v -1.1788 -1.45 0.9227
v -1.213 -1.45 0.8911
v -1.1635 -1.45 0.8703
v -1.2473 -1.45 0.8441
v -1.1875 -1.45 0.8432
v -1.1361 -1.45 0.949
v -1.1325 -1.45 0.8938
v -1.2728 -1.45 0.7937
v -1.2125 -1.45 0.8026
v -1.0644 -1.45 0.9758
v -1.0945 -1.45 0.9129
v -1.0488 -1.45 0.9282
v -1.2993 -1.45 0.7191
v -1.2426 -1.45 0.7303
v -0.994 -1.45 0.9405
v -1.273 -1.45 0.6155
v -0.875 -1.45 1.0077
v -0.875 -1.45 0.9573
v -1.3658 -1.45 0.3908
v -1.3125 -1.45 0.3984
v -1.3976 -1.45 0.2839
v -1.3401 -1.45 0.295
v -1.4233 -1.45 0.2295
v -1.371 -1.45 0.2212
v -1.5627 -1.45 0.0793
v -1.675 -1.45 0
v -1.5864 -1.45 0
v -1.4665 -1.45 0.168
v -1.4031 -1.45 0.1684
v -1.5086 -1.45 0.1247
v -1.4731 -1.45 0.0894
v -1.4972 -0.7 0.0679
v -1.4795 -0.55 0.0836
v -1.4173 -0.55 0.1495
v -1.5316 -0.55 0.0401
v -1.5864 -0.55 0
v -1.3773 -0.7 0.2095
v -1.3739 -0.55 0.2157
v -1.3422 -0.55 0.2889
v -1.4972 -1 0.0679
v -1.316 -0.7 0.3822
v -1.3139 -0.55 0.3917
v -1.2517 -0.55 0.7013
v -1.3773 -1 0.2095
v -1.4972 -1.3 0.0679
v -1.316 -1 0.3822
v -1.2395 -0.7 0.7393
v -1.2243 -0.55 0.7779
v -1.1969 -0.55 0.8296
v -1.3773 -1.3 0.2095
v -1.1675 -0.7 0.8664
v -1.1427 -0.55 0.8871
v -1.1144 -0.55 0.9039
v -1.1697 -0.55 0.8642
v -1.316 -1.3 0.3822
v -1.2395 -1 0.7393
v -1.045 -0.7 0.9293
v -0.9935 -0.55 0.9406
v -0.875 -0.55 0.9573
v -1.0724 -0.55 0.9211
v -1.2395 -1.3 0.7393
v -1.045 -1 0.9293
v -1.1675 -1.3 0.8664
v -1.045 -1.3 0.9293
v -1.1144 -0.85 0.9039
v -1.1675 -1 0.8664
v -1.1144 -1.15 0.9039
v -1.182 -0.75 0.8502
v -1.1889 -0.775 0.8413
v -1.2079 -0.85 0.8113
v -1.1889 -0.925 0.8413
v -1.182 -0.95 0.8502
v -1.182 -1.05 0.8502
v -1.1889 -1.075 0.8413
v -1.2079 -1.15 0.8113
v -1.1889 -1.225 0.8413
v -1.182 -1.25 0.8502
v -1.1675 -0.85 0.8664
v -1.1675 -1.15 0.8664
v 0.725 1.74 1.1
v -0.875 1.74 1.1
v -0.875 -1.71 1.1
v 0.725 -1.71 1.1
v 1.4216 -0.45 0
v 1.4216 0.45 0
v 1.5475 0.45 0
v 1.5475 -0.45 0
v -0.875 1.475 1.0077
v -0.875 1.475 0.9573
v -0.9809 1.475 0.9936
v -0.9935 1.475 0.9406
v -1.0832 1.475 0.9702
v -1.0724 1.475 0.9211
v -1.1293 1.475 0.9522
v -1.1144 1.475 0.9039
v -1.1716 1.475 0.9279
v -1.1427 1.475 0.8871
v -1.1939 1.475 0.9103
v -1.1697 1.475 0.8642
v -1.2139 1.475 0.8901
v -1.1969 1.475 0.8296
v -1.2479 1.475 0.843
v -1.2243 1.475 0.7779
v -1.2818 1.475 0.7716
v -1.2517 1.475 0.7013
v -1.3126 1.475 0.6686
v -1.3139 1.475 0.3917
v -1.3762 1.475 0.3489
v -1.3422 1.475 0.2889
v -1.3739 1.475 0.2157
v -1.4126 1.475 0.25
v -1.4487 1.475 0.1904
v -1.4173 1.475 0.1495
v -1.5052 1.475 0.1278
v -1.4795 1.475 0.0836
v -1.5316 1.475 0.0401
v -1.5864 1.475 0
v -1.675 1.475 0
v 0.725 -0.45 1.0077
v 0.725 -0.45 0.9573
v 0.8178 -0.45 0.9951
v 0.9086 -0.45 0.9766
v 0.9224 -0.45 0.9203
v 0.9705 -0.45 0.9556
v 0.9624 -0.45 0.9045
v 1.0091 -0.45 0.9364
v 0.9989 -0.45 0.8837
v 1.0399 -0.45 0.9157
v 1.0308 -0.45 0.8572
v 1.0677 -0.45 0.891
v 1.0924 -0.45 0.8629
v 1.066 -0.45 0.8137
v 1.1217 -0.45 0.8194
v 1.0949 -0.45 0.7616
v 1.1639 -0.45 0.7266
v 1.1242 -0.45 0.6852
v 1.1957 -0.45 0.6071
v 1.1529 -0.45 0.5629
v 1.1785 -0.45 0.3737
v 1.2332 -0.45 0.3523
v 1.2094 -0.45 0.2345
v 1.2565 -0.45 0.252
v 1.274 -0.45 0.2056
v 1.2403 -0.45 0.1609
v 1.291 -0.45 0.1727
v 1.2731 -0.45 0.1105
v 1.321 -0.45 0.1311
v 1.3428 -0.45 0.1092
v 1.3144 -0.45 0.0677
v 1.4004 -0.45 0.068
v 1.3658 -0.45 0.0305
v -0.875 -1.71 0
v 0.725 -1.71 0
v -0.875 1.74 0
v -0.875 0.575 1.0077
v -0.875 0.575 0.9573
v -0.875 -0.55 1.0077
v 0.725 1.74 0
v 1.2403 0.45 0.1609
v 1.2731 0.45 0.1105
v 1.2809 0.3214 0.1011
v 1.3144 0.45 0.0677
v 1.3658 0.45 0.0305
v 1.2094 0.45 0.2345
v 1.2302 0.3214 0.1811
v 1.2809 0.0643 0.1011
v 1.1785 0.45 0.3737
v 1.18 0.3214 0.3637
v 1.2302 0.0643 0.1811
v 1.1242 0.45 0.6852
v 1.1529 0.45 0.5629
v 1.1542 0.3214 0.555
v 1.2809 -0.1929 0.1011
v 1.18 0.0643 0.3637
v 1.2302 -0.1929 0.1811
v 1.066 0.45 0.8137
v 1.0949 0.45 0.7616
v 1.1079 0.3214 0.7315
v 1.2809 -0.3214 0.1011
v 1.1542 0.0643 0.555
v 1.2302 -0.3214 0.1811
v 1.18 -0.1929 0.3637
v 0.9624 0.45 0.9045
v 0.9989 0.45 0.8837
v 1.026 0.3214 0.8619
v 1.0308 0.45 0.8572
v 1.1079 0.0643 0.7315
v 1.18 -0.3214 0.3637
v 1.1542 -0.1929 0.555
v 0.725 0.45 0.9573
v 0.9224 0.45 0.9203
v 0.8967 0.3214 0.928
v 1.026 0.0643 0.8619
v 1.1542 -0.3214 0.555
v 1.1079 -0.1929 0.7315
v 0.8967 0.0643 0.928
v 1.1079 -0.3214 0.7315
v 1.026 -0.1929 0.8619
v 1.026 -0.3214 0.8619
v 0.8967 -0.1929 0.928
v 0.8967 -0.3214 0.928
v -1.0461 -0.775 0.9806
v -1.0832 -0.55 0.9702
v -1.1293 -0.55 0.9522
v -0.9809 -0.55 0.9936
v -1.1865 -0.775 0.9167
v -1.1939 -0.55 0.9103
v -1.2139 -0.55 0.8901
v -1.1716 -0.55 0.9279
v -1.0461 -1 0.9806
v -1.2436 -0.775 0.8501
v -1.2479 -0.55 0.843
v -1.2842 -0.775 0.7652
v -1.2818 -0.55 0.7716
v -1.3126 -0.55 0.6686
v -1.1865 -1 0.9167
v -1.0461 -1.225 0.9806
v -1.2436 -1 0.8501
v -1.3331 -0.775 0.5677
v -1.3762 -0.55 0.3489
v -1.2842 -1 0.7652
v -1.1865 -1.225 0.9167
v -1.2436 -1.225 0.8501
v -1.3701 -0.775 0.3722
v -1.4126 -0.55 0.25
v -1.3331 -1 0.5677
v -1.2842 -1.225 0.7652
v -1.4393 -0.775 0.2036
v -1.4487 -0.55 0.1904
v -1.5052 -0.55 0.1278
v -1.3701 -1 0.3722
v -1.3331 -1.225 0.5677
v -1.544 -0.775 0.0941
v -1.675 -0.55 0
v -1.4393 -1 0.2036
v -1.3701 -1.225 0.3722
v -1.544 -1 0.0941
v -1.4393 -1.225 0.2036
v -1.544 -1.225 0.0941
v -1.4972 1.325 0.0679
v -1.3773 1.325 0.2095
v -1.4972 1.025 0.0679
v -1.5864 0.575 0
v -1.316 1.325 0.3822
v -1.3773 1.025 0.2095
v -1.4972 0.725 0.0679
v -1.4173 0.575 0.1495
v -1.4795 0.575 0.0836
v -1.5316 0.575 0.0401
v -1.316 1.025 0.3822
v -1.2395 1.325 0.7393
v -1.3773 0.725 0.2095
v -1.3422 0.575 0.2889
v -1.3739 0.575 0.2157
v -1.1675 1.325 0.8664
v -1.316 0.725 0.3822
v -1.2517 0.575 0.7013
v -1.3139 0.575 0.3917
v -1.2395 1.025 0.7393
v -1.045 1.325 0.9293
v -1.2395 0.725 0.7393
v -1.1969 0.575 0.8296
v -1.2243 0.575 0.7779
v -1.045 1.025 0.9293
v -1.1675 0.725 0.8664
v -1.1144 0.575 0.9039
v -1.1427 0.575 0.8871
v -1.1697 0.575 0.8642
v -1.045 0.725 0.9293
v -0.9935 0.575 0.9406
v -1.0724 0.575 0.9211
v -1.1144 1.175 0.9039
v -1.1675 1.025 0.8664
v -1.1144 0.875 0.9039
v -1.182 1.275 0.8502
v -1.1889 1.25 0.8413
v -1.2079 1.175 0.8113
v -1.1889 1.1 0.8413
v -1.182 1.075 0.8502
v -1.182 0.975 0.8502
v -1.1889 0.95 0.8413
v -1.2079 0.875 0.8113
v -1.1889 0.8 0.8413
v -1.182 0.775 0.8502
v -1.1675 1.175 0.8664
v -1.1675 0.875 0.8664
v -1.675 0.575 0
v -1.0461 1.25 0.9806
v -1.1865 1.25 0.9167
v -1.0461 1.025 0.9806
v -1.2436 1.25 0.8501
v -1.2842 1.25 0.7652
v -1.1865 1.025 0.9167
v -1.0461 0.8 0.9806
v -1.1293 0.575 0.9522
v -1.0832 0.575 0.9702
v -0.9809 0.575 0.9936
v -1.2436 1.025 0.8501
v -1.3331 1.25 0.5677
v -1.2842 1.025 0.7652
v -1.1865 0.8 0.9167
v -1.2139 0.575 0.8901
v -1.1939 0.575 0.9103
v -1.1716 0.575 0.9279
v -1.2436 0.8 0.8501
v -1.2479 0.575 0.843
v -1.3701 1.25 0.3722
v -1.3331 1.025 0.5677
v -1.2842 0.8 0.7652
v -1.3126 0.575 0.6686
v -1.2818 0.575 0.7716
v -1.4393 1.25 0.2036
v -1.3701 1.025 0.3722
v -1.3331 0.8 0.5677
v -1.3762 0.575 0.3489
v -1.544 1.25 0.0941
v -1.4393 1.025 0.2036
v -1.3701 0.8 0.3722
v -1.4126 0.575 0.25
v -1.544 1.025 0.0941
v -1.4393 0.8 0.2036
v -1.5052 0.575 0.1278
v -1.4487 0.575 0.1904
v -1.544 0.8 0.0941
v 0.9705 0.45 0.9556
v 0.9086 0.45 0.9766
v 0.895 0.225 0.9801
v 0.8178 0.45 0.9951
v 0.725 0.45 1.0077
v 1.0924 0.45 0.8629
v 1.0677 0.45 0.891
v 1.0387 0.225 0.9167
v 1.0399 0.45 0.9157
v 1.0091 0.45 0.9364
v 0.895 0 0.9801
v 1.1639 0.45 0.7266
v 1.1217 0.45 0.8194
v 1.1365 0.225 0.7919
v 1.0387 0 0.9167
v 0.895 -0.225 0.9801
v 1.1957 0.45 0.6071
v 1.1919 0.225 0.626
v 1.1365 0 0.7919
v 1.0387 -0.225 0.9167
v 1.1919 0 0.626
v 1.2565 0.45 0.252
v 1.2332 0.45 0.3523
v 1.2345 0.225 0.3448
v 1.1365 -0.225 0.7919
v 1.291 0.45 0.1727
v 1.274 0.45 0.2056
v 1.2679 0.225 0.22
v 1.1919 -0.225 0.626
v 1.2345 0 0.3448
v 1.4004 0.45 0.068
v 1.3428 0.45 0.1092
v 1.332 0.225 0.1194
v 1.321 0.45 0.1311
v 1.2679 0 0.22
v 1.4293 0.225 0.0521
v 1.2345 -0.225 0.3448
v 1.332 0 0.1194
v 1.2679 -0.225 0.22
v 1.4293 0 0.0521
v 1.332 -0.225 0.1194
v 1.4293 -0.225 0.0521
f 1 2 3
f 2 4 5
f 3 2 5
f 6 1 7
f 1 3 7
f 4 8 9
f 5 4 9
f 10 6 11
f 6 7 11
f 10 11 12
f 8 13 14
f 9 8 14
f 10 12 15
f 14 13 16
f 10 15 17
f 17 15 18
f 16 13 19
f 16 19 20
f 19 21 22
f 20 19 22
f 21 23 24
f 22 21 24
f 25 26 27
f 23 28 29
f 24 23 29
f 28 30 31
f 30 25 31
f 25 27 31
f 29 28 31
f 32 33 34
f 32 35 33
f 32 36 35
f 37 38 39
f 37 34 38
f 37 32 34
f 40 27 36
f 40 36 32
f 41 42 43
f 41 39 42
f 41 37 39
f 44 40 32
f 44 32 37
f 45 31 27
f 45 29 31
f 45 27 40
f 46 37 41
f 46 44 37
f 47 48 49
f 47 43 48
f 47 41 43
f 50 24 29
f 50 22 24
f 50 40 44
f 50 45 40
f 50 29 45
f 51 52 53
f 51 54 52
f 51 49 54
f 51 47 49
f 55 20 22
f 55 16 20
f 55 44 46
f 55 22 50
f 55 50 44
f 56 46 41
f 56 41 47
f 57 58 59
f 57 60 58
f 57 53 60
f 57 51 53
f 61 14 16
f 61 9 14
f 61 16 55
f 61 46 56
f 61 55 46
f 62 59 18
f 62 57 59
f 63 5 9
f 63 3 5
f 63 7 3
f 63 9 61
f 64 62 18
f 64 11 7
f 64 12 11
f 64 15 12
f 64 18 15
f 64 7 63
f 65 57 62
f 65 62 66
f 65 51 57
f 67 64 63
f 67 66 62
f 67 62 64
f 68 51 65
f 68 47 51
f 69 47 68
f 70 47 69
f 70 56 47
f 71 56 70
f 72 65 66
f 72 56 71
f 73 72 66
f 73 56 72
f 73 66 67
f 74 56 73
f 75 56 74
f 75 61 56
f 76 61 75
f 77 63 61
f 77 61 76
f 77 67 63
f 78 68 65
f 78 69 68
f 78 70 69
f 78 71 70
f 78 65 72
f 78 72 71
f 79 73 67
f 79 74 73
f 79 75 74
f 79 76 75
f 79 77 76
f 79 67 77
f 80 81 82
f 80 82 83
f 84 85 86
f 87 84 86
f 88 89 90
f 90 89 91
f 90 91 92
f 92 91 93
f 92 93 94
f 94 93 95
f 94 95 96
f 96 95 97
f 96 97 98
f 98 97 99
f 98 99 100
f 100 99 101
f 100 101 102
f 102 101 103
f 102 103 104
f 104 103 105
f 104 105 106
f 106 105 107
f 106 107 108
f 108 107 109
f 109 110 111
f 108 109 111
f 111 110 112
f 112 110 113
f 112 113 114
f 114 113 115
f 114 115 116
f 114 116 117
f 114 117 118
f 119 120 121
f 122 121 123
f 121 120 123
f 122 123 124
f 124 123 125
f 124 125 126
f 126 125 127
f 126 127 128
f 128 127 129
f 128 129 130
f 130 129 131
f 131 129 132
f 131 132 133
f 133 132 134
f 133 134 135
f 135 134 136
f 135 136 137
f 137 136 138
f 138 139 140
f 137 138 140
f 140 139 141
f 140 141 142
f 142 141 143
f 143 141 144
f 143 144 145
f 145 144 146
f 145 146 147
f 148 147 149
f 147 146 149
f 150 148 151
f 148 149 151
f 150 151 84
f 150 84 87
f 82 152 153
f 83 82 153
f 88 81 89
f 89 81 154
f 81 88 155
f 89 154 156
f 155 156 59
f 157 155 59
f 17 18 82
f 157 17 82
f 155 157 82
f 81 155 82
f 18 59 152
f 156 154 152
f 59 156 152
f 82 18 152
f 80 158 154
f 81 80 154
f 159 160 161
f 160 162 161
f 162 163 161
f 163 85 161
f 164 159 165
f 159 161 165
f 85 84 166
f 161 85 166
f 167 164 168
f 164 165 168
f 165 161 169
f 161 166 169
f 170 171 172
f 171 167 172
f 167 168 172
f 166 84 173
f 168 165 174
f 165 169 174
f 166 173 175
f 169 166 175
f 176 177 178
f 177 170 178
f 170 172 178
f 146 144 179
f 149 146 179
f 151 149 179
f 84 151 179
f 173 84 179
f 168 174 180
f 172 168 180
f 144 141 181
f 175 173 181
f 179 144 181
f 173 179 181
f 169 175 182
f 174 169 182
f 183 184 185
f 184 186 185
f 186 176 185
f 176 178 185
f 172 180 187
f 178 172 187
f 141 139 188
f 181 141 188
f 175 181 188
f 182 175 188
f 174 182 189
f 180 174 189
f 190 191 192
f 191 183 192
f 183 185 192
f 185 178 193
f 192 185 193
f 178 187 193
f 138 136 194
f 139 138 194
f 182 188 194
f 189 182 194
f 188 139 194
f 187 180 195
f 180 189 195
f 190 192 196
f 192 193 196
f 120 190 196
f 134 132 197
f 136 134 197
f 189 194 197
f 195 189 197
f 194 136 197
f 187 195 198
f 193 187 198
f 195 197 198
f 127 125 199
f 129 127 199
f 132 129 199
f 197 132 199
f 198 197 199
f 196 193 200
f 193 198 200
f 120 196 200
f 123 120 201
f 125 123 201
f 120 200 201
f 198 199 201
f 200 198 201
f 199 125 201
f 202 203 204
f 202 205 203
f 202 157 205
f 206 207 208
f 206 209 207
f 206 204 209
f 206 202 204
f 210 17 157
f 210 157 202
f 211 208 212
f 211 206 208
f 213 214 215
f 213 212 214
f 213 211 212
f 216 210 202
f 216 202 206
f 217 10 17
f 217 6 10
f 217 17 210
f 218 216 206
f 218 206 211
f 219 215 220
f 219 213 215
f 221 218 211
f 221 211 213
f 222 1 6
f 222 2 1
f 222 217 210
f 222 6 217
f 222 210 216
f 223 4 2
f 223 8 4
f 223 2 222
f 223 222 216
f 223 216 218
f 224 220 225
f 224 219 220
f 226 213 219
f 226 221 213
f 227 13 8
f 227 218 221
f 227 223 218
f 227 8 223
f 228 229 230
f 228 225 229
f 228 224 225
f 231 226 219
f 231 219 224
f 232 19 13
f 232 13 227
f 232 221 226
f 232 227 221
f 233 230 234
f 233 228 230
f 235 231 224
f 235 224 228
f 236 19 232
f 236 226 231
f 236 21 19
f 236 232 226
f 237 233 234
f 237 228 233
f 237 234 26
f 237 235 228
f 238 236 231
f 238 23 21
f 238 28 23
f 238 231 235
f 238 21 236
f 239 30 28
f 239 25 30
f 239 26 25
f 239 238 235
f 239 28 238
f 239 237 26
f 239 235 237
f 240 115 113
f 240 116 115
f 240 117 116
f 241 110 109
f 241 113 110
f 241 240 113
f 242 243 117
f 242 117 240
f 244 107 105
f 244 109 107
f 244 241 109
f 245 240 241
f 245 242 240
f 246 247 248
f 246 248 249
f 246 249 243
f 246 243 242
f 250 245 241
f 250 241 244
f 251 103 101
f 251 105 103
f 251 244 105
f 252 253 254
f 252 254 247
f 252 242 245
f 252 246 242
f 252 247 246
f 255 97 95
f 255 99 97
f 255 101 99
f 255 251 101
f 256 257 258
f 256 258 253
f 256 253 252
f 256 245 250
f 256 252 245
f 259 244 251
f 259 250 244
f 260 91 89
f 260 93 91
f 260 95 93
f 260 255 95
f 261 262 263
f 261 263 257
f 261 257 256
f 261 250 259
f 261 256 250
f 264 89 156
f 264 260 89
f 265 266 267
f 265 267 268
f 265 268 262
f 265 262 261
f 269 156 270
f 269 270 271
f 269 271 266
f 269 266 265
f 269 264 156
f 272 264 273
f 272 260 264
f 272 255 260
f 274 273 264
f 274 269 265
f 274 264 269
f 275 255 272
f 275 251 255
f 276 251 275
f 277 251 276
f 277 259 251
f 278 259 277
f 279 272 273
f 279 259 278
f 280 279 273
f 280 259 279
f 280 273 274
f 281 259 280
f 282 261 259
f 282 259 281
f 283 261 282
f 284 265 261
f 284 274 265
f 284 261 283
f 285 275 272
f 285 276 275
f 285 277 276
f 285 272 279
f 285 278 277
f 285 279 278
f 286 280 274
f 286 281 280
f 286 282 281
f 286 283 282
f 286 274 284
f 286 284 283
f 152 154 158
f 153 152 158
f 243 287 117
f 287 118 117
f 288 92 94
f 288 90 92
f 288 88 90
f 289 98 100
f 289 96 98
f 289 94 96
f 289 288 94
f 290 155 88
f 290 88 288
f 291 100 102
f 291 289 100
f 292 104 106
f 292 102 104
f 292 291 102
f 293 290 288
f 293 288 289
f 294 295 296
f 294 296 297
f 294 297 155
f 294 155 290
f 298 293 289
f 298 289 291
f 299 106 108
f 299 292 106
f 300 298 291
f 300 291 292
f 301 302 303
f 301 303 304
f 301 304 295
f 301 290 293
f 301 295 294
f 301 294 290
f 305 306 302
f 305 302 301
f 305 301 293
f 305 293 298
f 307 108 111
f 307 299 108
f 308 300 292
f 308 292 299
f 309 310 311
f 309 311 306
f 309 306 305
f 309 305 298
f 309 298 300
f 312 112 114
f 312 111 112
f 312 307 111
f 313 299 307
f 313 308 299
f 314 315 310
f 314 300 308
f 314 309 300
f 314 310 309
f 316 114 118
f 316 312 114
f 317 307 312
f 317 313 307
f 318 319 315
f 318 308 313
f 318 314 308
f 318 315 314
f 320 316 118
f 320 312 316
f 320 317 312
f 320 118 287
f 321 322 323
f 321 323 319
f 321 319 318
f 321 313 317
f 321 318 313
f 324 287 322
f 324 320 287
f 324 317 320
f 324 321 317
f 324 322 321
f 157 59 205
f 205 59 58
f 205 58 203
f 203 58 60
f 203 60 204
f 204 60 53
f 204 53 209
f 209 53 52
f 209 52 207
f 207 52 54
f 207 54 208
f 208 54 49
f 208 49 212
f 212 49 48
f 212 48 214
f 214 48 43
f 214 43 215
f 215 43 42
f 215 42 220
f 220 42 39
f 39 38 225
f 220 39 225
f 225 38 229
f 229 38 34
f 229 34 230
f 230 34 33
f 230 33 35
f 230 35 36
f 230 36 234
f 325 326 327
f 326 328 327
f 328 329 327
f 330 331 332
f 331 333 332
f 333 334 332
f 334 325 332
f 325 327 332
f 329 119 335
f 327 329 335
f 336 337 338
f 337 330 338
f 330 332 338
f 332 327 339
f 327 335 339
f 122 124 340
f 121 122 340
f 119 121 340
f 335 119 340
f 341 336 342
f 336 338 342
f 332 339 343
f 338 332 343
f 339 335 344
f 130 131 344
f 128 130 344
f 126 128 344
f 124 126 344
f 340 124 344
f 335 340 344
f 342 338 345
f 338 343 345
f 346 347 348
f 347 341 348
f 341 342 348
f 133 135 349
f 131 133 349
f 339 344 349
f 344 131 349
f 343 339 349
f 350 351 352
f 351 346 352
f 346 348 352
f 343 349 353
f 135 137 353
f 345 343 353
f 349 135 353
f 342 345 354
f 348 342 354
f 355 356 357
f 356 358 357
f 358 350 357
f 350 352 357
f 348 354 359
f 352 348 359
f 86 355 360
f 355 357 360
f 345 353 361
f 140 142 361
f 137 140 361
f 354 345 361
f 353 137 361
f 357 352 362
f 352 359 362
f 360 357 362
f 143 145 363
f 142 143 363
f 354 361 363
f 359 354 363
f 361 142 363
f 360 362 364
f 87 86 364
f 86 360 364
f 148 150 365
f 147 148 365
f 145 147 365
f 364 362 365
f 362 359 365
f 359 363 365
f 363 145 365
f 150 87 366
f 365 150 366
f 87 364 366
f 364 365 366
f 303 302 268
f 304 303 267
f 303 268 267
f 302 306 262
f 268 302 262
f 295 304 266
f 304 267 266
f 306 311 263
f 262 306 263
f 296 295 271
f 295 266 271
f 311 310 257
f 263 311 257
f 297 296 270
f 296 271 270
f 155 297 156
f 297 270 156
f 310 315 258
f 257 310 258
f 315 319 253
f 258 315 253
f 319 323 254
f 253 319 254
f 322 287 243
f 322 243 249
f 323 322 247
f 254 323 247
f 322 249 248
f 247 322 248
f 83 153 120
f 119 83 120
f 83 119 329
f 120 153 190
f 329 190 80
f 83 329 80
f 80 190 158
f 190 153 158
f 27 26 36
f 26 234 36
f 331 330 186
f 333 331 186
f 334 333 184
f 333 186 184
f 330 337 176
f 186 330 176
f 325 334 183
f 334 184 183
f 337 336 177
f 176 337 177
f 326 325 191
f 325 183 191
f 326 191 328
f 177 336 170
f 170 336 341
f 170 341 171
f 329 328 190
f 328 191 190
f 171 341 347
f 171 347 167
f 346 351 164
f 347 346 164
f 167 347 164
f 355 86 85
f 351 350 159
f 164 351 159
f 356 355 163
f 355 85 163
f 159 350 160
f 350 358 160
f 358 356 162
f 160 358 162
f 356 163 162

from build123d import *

# Parameters (mm, degrees)
EXTRUDE1_DEPTH     = 1.1
CUT_EXTRUDE1_DEPTH = 4.19
CUT_EXTRUDE2_DEPTH = 4.19


with BuildPart() as part:
    # COMPONENT_OUTLINE → Extrude1 (new body)
    with BuildSketch(Plane.XY):
        Polygon((-0.875, -1.71), (0.725, -1.71), (0.725, -0.45), (1.5475, -0.45), (1.5475, 0.45), (0.725, 0.45), (0.725, 1.74), (-0.875, 1.74), (-0.875, 1.475), (-1.675, 1.475), (-1.675, 0.575), (-0.875, 0.575), (-0.875, -0.55), (-1.675, -0.55), (-1.675, -1.45), (-0.875, -1.45), align=None)
    extrude(amount=EXTRUDE1_DEPTH)

    # Sketch1 → Cut-Extrude1 (cut, through all)
    with BuildSketch(Plane.XZ.offset(1.45)):
        with BuildLine():
            Line((0.725, 1.1), (1.5475, 1.1))
            Line((1.5475, 1.1), (1.5475, 0))
            add(Edge.make_bspline(
                [(0.725, 1.007684008), (0.841255766, 0.993236255), (1.074434419, 0.964257843), (1.240697247, 0.566279231), (1.212102737, 0.136753725), (1.466368993, 0.033080078), (1.5475, 0)],
                knots=[0, 0, 0, 0, 0.228895666, 0.459104825, 0.827411741, 1, 1, 1, 1], degree=3))
            Line((0.725, 1.007684008), (0.725, 1.1))
        make_face()
        with BuildLine():
            Line((-0.875, 1.1), (-0.875, 1.007684008))
            add(Edge.make_bspline(
                [(-0.875, 1.007684008), (-0.992502858, 0.993714751), (-1.247070824, 0.963450589), (-1.342415555, 0.56189323), (-1.384469235, 0.196400416), (-1.584715613, 0.061032749), (-1.675, 0)],
                knots=[0, 0, 0, 0, 0.232825369, 0.504412246, 0.776556075, 1, 1, 1, 1], degree=3))
            Line((-1.675, 0), (-1.675, 1.1))
            Line((-1.675, 1.1), (-0.875, 1.1))
        make_face()
    extrude(amount=-CUT_EXTRUDE1_DEPTH, mode=Mode.SUBTRACT)

    # Sketch2 → Cut-Extrude2 (cut, through all)
    with BuildSketch(Plane.XZ.offset(1.45)):
        with BuildLine():
            Line((0.725, 0), (1.421572568, 0))
            add(Edge.make_bspline(
                [(1.421572568, 0), (1.398439084, 0.011285624), (1.375838095, 0.023644995), (1.327364404, 0.055460599), (1.301887511, 0.076567597), (1.259910489, 0.125534473), (1.243394855, 0.152637933), (1.177610694, 0.294933575), (1.174271294, 0.429683105), (1.134079821, 0.680245939), (1.093633579, 0.798176416), (0.992225356, 0.893756481), (0.949632552, 0.913640339), (0.845445066, 0.941870469), (0.7862927, 0.949660717), (0.725, 0.957298469)],
                knots=[0.07541425, 0.07541425, 0.07541425, 0.07541425, 0.125, 0.125, 0.1875, 0.1875, 0.25, 0.25, 0.5, 0.5, 0.75, 0.75, 0.875, 0.875, 0.995948591, 0.995948591, 0.995948591, 0.995948591], degree=3))
            Line((0.725, 0.957298469), (0.725, 0))
        make_face()
        with BuildLine():
            Line((-1.586416297, 0), (-0.875, 0))
            Line((-0.875, 0), (-0.875, 0.957331048))
            add(Edge.make_bspline(
                [(-1.586416297, 0), (-1.555884998, 0.021384965), (-1.525710826, 0.043709629), (-1.449960416, 0.108153898), (-1.406998869, 0.155193673), (-1.317807524, 0.317989625), (-1.304878373, 0.44302641), (-1.260607801, 0.687731731), (-1.227980141, 0.806351912), (-1.137249482, 0.896473216), (-1.096849985, 0.915474598), (-0.994853528, 0.942624737), (-0.935985962, 0.950060656), (-0.875, 0.957331048)],
                knots=[0.049723417, 0.049723417, 0.049723417, 0.049723417, 0.125, 0.125, 0.25, 0.25, 0.5, 0.5, 0.75, 0.75, 0.875, 0.875, 0.996097337, 0.996097337, 0.996097337, 0.996097337], degree=3))
        make_face()
    extrude(amount=-CUT_EXTRUDE2_DEPTH, mode=Mode.SUBTRACT)


solid = part.part
